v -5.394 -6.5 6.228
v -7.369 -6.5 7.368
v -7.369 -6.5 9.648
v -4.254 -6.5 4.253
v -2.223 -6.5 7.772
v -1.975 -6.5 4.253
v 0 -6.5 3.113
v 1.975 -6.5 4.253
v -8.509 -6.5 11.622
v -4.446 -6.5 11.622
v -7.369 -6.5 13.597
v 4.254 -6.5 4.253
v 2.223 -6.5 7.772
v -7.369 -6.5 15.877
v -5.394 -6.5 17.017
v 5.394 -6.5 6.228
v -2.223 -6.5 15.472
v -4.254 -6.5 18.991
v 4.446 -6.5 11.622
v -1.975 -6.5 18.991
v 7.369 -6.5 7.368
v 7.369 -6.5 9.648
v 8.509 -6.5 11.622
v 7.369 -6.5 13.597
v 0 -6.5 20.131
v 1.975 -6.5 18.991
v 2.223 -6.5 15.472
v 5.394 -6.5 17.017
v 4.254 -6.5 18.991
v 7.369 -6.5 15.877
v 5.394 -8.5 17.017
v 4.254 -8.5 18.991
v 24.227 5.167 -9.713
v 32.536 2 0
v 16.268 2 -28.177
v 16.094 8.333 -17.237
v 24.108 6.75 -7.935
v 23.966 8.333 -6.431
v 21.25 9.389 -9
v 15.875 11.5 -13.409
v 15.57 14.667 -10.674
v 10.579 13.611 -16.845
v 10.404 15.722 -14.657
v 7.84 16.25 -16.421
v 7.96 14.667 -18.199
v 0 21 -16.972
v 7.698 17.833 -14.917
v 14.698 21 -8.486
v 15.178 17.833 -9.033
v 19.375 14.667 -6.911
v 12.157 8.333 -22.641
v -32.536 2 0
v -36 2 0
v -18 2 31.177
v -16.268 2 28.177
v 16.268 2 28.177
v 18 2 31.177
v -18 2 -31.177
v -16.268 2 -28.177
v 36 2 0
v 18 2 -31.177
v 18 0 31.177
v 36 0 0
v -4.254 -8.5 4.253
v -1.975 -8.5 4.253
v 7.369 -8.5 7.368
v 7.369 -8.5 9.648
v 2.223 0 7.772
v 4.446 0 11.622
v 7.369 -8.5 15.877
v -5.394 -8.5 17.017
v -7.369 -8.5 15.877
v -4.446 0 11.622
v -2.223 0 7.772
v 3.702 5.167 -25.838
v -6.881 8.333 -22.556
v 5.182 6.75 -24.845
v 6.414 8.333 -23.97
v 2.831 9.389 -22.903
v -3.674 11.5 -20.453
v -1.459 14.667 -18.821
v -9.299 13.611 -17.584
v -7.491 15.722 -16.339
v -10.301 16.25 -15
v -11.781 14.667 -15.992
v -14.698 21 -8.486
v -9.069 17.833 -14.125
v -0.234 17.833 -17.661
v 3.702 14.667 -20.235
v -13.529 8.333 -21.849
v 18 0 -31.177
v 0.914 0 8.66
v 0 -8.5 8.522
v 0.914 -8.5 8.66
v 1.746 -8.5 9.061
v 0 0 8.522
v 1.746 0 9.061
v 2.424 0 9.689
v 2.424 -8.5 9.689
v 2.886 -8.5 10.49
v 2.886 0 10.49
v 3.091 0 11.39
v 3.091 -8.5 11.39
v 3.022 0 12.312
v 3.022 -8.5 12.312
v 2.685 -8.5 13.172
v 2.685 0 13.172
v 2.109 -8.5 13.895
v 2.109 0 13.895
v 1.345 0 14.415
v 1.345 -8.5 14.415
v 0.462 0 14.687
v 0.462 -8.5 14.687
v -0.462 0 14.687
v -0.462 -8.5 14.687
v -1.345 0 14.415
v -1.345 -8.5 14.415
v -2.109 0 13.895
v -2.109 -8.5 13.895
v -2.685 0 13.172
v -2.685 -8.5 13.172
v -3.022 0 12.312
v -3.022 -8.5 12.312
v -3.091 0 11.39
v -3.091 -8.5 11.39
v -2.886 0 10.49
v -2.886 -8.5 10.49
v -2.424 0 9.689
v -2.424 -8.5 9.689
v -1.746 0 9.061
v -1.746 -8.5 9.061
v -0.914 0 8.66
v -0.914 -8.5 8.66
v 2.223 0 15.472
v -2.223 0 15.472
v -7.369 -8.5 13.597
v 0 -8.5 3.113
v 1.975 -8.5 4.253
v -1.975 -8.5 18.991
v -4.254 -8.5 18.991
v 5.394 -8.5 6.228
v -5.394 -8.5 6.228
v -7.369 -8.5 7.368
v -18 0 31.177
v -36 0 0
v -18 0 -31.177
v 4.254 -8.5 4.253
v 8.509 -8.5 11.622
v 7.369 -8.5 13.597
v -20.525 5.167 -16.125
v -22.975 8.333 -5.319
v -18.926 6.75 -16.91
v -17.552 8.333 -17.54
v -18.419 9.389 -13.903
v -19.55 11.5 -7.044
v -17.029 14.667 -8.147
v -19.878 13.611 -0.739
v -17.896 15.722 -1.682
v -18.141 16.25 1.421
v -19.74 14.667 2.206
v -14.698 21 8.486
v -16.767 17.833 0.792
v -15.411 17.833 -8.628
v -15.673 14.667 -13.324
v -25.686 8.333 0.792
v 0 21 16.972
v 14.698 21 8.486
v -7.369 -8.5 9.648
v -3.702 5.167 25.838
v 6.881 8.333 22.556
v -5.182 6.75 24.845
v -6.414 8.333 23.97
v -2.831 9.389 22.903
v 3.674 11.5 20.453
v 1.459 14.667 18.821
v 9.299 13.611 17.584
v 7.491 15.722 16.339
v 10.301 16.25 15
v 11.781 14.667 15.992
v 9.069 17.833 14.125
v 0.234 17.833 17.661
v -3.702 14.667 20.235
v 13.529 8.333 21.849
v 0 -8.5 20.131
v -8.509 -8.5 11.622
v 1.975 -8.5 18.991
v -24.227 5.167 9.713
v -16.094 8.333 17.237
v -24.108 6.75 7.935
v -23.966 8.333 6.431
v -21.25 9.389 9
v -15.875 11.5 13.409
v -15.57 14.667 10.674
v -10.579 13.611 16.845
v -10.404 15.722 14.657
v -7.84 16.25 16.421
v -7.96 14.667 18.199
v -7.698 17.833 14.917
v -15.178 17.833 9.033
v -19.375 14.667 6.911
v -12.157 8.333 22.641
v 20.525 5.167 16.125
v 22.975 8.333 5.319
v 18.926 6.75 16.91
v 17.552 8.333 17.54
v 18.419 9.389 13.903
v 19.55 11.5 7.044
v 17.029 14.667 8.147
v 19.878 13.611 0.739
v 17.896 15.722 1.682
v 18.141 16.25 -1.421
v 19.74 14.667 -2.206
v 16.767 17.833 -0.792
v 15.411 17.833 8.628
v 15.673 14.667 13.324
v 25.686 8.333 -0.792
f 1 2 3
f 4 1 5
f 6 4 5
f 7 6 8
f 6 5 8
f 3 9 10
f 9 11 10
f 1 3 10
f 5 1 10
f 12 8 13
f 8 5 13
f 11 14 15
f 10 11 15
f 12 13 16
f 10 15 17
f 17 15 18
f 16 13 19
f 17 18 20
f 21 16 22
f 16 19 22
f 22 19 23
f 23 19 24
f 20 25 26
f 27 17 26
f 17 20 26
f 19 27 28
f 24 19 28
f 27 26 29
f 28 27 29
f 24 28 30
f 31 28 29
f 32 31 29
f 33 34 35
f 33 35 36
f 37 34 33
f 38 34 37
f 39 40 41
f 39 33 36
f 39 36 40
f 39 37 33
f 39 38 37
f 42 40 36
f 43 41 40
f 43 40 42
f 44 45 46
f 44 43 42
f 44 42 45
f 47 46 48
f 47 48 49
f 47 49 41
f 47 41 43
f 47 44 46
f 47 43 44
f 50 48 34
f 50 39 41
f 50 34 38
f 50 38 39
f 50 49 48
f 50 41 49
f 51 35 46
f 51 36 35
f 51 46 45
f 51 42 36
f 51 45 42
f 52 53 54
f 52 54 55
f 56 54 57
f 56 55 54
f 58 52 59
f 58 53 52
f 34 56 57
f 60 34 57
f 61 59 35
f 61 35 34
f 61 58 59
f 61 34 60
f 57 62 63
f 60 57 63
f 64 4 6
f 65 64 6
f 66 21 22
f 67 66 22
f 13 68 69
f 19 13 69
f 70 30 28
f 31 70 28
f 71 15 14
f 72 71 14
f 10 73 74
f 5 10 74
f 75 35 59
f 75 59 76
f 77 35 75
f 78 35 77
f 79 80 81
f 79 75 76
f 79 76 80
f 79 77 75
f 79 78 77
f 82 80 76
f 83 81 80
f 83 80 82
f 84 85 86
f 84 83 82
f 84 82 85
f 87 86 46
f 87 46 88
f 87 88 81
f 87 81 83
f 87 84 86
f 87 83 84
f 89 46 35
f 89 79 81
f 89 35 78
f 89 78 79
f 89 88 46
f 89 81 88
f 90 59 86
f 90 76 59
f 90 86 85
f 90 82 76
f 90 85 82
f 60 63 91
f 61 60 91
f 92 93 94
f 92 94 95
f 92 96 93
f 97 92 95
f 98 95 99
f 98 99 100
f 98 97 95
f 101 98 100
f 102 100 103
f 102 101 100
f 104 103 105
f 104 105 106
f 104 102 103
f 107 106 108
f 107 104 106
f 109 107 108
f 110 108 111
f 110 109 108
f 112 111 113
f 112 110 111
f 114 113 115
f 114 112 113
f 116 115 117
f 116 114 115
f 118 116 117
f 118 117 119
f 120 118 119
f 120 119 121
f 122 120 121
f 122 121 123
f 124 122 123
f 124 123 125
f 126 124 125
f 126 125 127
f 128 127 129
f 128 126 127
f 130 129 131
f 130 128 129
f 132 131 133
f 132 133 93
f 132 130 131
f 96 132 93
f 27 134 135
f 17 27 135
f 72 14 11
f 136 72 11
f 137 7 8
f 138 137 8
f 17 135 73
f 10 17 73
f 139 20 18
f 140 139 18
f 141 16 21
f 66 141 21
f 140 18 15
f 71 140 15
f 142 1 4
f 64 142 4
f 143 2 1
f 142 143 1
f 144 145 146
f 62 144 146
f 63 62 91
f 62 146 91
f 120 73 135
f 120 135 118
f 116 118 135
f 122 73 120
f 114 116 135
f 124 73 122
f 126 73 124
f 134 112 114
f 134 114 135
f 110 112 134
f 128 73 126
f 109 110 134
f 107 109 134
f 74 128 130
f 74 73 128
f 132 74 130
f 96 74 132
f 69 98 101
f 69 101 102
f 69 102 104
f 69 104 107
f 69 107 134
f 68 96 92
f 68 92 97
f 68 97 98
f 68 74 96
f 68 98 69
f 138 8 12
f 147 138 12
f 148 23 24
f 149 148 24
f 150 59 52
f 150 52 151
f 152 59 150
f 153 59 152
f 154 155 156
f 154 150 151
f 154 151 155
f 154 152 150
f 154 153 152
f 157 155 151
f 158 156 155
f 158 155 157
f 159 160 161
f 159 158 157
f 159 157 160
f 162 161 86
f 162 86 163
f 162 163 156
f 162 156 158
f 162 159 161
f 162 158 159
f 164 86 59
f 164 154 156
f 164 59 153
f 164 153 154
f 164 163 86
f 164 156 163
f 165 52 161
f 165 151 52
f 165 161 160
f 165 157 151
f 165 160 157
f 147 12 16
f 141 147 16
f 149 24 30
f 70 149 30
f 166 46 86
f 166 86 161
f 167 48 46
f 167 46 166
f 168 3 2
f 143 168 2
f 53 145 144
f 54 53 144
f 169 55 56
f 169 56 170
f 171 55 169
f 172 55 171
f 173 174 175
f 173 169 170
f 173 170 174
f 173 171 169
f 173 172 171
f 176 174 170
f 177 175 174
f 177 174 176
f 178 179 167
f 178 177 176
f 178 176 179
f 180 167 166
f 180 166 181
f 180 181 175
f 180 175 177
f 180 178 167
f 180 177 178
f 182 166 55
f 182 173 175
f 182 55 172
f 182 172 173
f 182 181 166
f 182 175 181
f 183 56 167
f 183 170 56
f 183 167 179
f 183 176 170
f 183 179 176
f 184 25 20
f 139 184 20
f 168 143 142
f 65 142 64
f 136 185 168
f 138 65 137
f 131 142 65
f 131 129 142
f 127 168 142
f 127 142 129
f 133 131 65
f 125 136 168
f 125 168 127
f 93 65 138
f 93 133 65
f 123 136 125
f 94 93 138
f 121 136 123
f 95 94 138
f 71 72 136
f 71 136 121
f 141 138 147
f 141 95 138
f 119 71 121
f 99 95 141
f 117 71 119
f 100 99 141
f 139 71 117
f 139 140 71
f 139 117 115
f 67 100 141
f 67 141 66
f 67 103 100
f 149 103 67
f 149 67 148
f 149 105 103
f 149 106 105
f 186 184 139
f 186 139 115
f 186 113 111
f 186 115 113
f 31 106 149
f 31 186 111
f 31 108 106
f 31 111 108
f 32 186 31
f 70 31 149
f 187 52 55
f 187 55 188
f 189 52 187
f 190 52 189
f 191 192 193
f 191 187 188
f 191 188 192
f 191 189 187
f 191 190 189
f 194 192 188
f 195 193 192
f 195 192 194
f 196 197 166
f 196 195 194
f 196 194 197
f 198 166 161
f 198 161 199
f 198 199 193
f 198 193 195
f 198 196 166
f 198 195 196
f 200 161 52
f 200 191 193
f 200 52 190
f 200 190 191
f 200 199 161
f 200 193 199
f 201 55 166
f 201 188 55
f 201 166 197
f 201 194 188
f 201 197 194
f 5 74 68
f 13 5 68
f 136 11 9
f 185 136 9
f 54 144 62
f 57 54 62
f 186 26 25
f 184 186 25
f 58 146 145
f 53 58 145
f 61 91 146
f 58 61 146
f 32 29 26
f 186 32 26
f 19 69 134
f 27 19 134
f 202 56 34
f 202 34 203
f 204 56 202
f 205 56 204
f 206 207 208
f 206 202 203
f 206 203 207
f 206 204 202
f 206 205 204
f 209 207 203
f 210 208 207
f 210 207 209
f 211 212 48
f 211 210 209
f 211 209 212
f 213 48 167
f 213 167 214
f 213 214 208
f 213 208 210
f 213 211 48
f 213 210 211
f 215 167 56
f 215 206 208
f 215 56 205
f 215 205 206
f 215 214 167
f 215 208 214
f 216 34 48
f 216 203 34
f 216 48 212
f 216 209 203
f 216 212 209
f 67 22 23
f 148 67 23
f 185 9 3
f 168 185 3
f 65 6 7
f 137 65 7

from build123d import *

# Parameters (mm, degrees)
SKETCH3_R           = 3.1
BOSS_EXTRUDE1_DEPTH = 8.5
SKETCH6_R           = 36
CUT_EXTRUDE1_DEPTH  = 20.99999991
BOSS_EXTRUDE2_START = -2
SKETCH5_R           = 3.1
BOSS_EXTRUDE2_DEPTH = 2
SKETCH7_R           = 3.1
BOSS_EXTRUDE3_DEPTH = 2


with BuildPart() as part:
    # Loft1: read off the stored shape, not the designer's step
    # Loft1: loft between two sections, ruled curve by curve
    loft1_from = [
        Edge.make_bspline([(-18, 0, 31.176914536), (-12, 0, 31.176914536), (-6, 0, 31.176914536), (6, 0, 31.176914536), (12, 0, 31.176914536), (18, 0, 31.176914536)], [0, 0, 0, 0, 0.5, 0.5, 1, 1, 1, 1], 3),
        Edge.make_bspline([(18, 0, 31.176914536), (21, 0, 25.980762114), (24, 0, 20.784609691), (30, 0, 10.392304845), (33, 0, 5.196152423), (36, 0, 0)], [0, 0, 0, 0, 0.5, 0.5, 1, 1, 1, 1], 3),
        Edge.make_bspline([(-36, 0, 0), (-33, 0, 5.196152423), (-30, 0, 10.392304845), (-24, 0, 20.784609691), (-21, 0, 25.980762114), (-18, 0, 31.176914536)], [0, 0, 0, 0, 0.5, 0.5, 1, 1, 1, 1], 3),
        Edge.make_bspline([(36, 0, 0), (33, 0, -5.196152423), (30, 0, -10.392304845), (24, 0, -20.784609691), (21, 0, -25.980762114), (18, 0, -31.176914536)], [0, 0, 0, 0, 0.5, 0.5, 1, 1, 1, 1], 3),
        Edge.make_bspline([(18, 0, -31.176914536), (12, 0, -31.176914536), (6, 0, -31.176914536), (-6, 0, -31.176914536), (-12, 0, -31.176914536), (-18, 0, -31.176914536)], [0, 0, 0, 0, 0.5, 0.5, 1, 1, 1, 1], 3),
        Edge.make_bspline([(-18, 0, -31.176914536), (-21, 0, -25.980762114), (-24, 0, -20.784609691), (-30, 0, -10.392304845), (-33, 0, -5.196152423), (-36, 0, 0)], [0, 0, 0, 0, 0.5, 0.5, 1, 1, 1, 1], 3),
    ]
    loft1_to = [
        Edge.make_bspline([(0, 20.99999991, 18.6), (2.684678752, 20.99999991, 17.05), (5.369357503, 20.99999991, 15.5), (10.738715007, 20.99999991, 12.4), (13.423393759, 20.99999991, 10.85), (16.10807251, 20.99999991, 9.3)], [0, 0, 0, 0, 0.5, 0.5, 1, 1, 1, 1], 3),
        Edge.make_bspline([(16.10807251, 20.99999991, 9.3), (16.10807251, 20.99999991, 6.2), (16.10807251, 20.99999991, 3.1), (16.10807251, 20.99999991, -3.1), (16.10807251, 20.99999991, -6.2), (16.10807251, 20.99999991, -9.3)], [0, 0, 0, 0, 0.5, 0.5, 1, 1, 1, 1], 3),
        Edge.make_bspline([(-16.10807251, 20.99999991, 9.3), (-13.423393759, 20.99999991, 10.85), (-10.738715007, 20.99999991, 12.4), (-5.369357503, 20.99999991, 15.5), (-2.684678752, 20.99999991, 17.05), (0, 20.99999991, 18.6)], [0, 0, 0, 0, 0.5, 0.5, 1, 1, 1, 1], 3),
        Edge.make_bspline([(16.10807251, 20.99999991, -9.3), (13.423393759, 20.99999991, -10.85), (10.738715007, 20.99999991, -12.4), (5.369357503, 20.99999991, -15.5), (2.684678752, 20.99999991, -17.05), (0, 20.99999991, -18.6)], [0, 0, 0, 0, 0.5, 0.5, 1, 1, 1, 1], 3),
        Edge.make_bspline([(0, 20.99999991, -18.6), (-2.684678752, 20.99999991, -17.05), (-5.369357503, 20.99999991, -15.5), (-10.738715007, 20.99999991, -12.4), (-13.423393759, 20.99999991, -10.85), (-16.10807251, 20.99999991, -9.3)], [0, 0, 0, 0, 0.5, 0.5, 1, 1, 1, 1], 3),
        Edge.make_bspline([(-16.10807251, 20.99999991, -9.3), (-16.10807251, 20.99999991, -6.2), (-16.10807251, 20.99999991, -3.1), (-16.10807251, 20.99999991, 3.1), (-16.10807251, 20.99999991, 6.2), (-16.10807251, 20.99999991, 9.3)], [0, 0, 0, 0, 0.5, 0.5, 1, 1, 1, 1], 3),
    ]
    loft1 = Solid(Shell([*[Face.make_surface_from_curves(loft1_from[k], loft1_to[k]) for k in range(6)], Face(Wire(loft1_from)), Face(Wire(loft1_to))]))
    add(loft1)

    # Sketch3 → Boss-Extrude1 (add)
    with BuildSketch(Plane.XZ):
        Polygon((4.445597073, 11.622085464), (2.222798536, 15.472085464), (-2.222798536, 15.472085464), (-4.445597073, 11.622085464), (-2.222798536, 7.772085464), (2.222798536, 7.772085464), align=None)
        with Locations(Location((0, 11.622085464, 0), (0, 0, 270))):
            Circle(SKETCH3_R, mode=Mode.SUBTRACT)
    extrude(amount=BOSS_EXTRUDE1_DEPTH)

    # Sketch6 → Cut-Extrude1 (cut)
    with BuildSketch(Plane(origin=(0, 20.99999991, 0), x_dir=(1, 0, 0), z_dir=(0, 1, 0))):
        Circle(SKETCH6_R)
    extrude(amount=-CUT_EXTRUDE1_DEPTH, mode=Mode.SUBTRACT)

    # Sketch5 → Boss-Extrude2 (add)
    with BuildSketch(Plane.XZ.offset(8.5).offset(BOSS_EXTRUDE2_START)):
        Polygon((-8.509, 11.622085464), (-7.369010161, 9.647565142), (-7.369010161, 7.367585464), (-5.394489839, 6.227595625), (-4.2545, 4.253075303), (-1.974520322, 4.253075303), (0, 3.113085464), (1.974520322, 4.253075303), (4.2545, 4.253075303), (5.394489839, 6.227595625), (7.369010161, 7.367585464), (7.369010161, 9.647565142), (8.509, 11.622085464), (7.369010161, 13.596605785), (7.369010161, 15.876585464), (5.394489839, 17.016575303), (4.2545, 18.991095625), (1.974520322, 18.991095625), (0, 20.131085464), (-1.974520322, 18.991095625), (-4.2545, 18.991095625), (-5.394489839, 17.016575303), (-7.369010161, 15.876585464), (-7.369010161, 13.596605785), align=None)
        with Locations(Location((0, 11.622085464, 0), (0, 0, 270))):
            Circle(SKETCH5_R, mode=Mode.SUBTRACT)
    extrude(amount=BOSS_EXTRUDE2_DEPTH)


with BuildPart() as body_2:
    # Sketch7 → Boss-Extrude3 (new body)
    # profile 1 of 4: a face of its own
    with BuildSketch(Plane(origin=(0, 0, 0), x_dir=(1, 0, 0), z_dir=(0, 1, 0))):
        Polygon((18, 31.176914536), (-18, 31.176914536), (-36, 0), (-18, -31.176914536), (18, -31.176914536), (36, 0), align=None)
        Polygon((4.445597073, -11.622085464), (2.222798536, -7.772085464), (-2.222798536, -7.772085464), (-4.445597073, -11.622085464), (-2.222798536, -15.472085464), (2.222798536, -15.472085464), align=None, mode=Mode.SUBTRACT)
    # profile 2 of 4: a face of its own
    with BuildSketch(Plane(origin=(0, 0, 0), x_dir=(1, 0, 0), z_dir=(0, 1, 0))):
        Polygon((2.222798536, -15.472085464), (4.445597073, -11.622085464), (2.222798536, -7.772085464), (-2.222798536, -7.772085464), (-4.445597073, -11.622085464), (-2.222798536, -15.472085464), align=None)
        with Locations(Location((0, -11.622085464, 0), (0, 0, 90))):
            Circle(SKETCH7_R, mode=Mode.SUBTRACT)
    # profile 3 of 4: a face of its own
    with BuildSketch(Plane(origin=(0, 0, 0), x_dir=(1, 0, 0), z_dir=(0, 1, 0))):
        with Locations(Location((0, -11.622085464, 0), (0, 0, 90))):
            Circle(SKETCH7_R)
    # profile 4 of 4: a face of its own
    with BuildSketch(Plane(origin=(0, 0, 0), x_dir=(1, 0, 0), z_dir=(0, 1, 0))):
        Polygon((4.445597073, -11.622085464), (2.222798536, -7.772085464), (-2.222798536, -7.772085464), (-4.445597073, -11.622085464), (-2.222798536, -15.472085464), (2.222798536, -15.472085464), align=None)
    extrude(amount=BOSS_EXTRUDE3_DEPTH)

    # Loft2: read off the stored shape, not the designer's step
    # Loft2: loft between two sections, ruled curve by curve
    loft2_from = [
        Edge.make_bspline([(-32.535898385, 2, 0), (-29.824573519, 2, 4.696152423), (-27.113248654, 2, 9.392304845), (-21.690598923, 2, 18.784609691), (-18.979274058, 2, 23.480762114), (-16.267949192, 2, 28.176914536)], [0, 0, 0, 0, 0.5, 0.5, 1, 1, 1, 1], 3),
        Edge.make_bspline([(-16.267949192, 2, 28.176914536), (-10.845299462, 2, 28.176914536), (-5.422649731, 2, 28.176914536), (5.422649731, 2, 28.176914536), (10.845299462, 2, 28.176914536), (16.267949192, 2, 28.176914536)], [0, 0, 0, 0, 0.5, 0.5, 1, 1, 1, 1], 3),
        Edge.make_bspline([(-16.267949192, 2, -28.176914536), (-18.979274058, 2, -23.480762114), (-21.690598923, 2, -18.784609691), (-27.113248654, 2, -9.392304845), (-29.824573519, 2, -4.696152423), (-32.535898385, 2, 0)], [0, 0, 0, 0, 0.5, 0.5, 1, 1, 1, 1], 3),
        Edge.make_bspline([(16.267949192, 2, 28.176914536), (18.979274058, 2, 23.480762114), (21.690598923, 2, 18.784609691), (27.113248654, 2, 9.392304845), (29.824573519, 2, 4.696152423), (32.535898385, 2, 0)], [0, 0, 0, 0, 0.5, 0.5, 1, 1, 1, 1], 3),
        Edge.make_bspline([(32.535898385, 2, 0), (29.824573519, 2, -4.696152423), (27.113248654, 2, -9.392304845), (21.690598923, 2, -18.784609691), (18.979274058, 2, -23.480762114), (16.267949192, 2, -28.176914536)], [0, 0, 0, 0, 0.5, 0.5, 1, 1, 1, 1], 3),
        Edge.make_bspline([(16.267949192, 2, -28.176914536), (10.845299462, 2, -28.176914536), (5.422649731, 2, -28.176914536), (-5.422649731, 2, -28.176914536), (-10.845299462, 2, -28.176914536), (-16.267949192, 2, -28.176914536)], [0, 0, 0, 0, 0.5, 0.5, 1, 1, 1, 1], 3),
    ]
    loft2_to = [
        Edge.make_bspline([(-14.697928126, 21.0000001, 8.48585276), (-12.248273438, 21.0000001, 9.900161554), (-9.798618751, 21.0000001, 11.314470347), (-4.899309375, 21.0000001, 14.143087934), (-2.449654688, 21.0000001, 15.557396727), (0, 21.0000001, 16.97170552)], [0, 0, 0, 0, 0.5, 0.5, 1, 1, 1, 1], 3),
        Edge.make_bspline([(0, 21.0000001, 16.97170552), (2.449654688, 21.0000001, 15.557396727), (4.899309375, 21.0000001, 14.143087934), (9.798618751, 21.0000001, 11.314470347), (12.248273438, 21.0000001, 9.900161554), (14.697928126, 21.0000001, 8.48585276)], [0, 0, 0, 0, 0.5, 0.5, 1, 1, 1, 1], 3),
        Edge.make_bspline([(-14.697928126, 21.0000001, -8.48585276), (-14.697928126, 21.0000001, -5.657235173), (-14.697928126, 21.0000001, -2.828617587), (-14.697928126, 21.0000001, 2.828617587), (-14.697928126, 21.0000001, 5.657235173), (-14.697928126, 21.0000001, 8.48585276)], [0, 0, 0, 0, 0.5, 0.5, 1, 1, 1, 1], 3),
        Edge.make_bspline([(14.697928126, 21.0000001, 8.48585276), (14.697928126, 21.0000001, 5.657235173), (14.697928126, 21.0000001, 2.828617587), (14.697928126, 21.0000001, -2.828617587), (14.697928126, 21.0000001, -5.657235173), (14.697928126, 21.0000001, -8.48585276)], [0, 0, 0, 0, 0.5, 0.5, 1, 1, 1, 1], 3),
        Edge.make_bspline([(14.697928126, 21.0000001, -8.48585276), (12.248273438, 21.0000001, -9.900161554), (9.798618751, 21.0000001, -11.314470347), (4.899309375, 21.0000001, -14.143087934), (2.449654688, 21.0000001, -15.557396727), (0, 21.0000001, -16.97170552)], [0, 0, 0, 0, 0.5, 0.5, 1, 1, 1, 1], 3),
        Edge.make_bspline([(0, 21.0000001, -16.97170552), (-2.449654688, 21.0000001, -15.557396727), (-4.899309375, 21.0000001, -14.143087934), (-9.798618751, 21.0000001, -11.314470347), (-12.248273438, 21.0000001, -9.900161554), (-14.697928126, 21.0000001, -8.48585276)], [0, 0, 0, 0, 0.5, 0.5, 1, 1, 1, 1], 3),
    ]
    loft2 = Solid(Shell([*[Face.make_surface_from_curves(loft2_from[k], loft2_to[k]) for k in range(6)], Face(Wire(loft2_from)), Face(Wire(loft2_to))]))
    add(loft2)


solid = Compound([part.part, body_2.part])
